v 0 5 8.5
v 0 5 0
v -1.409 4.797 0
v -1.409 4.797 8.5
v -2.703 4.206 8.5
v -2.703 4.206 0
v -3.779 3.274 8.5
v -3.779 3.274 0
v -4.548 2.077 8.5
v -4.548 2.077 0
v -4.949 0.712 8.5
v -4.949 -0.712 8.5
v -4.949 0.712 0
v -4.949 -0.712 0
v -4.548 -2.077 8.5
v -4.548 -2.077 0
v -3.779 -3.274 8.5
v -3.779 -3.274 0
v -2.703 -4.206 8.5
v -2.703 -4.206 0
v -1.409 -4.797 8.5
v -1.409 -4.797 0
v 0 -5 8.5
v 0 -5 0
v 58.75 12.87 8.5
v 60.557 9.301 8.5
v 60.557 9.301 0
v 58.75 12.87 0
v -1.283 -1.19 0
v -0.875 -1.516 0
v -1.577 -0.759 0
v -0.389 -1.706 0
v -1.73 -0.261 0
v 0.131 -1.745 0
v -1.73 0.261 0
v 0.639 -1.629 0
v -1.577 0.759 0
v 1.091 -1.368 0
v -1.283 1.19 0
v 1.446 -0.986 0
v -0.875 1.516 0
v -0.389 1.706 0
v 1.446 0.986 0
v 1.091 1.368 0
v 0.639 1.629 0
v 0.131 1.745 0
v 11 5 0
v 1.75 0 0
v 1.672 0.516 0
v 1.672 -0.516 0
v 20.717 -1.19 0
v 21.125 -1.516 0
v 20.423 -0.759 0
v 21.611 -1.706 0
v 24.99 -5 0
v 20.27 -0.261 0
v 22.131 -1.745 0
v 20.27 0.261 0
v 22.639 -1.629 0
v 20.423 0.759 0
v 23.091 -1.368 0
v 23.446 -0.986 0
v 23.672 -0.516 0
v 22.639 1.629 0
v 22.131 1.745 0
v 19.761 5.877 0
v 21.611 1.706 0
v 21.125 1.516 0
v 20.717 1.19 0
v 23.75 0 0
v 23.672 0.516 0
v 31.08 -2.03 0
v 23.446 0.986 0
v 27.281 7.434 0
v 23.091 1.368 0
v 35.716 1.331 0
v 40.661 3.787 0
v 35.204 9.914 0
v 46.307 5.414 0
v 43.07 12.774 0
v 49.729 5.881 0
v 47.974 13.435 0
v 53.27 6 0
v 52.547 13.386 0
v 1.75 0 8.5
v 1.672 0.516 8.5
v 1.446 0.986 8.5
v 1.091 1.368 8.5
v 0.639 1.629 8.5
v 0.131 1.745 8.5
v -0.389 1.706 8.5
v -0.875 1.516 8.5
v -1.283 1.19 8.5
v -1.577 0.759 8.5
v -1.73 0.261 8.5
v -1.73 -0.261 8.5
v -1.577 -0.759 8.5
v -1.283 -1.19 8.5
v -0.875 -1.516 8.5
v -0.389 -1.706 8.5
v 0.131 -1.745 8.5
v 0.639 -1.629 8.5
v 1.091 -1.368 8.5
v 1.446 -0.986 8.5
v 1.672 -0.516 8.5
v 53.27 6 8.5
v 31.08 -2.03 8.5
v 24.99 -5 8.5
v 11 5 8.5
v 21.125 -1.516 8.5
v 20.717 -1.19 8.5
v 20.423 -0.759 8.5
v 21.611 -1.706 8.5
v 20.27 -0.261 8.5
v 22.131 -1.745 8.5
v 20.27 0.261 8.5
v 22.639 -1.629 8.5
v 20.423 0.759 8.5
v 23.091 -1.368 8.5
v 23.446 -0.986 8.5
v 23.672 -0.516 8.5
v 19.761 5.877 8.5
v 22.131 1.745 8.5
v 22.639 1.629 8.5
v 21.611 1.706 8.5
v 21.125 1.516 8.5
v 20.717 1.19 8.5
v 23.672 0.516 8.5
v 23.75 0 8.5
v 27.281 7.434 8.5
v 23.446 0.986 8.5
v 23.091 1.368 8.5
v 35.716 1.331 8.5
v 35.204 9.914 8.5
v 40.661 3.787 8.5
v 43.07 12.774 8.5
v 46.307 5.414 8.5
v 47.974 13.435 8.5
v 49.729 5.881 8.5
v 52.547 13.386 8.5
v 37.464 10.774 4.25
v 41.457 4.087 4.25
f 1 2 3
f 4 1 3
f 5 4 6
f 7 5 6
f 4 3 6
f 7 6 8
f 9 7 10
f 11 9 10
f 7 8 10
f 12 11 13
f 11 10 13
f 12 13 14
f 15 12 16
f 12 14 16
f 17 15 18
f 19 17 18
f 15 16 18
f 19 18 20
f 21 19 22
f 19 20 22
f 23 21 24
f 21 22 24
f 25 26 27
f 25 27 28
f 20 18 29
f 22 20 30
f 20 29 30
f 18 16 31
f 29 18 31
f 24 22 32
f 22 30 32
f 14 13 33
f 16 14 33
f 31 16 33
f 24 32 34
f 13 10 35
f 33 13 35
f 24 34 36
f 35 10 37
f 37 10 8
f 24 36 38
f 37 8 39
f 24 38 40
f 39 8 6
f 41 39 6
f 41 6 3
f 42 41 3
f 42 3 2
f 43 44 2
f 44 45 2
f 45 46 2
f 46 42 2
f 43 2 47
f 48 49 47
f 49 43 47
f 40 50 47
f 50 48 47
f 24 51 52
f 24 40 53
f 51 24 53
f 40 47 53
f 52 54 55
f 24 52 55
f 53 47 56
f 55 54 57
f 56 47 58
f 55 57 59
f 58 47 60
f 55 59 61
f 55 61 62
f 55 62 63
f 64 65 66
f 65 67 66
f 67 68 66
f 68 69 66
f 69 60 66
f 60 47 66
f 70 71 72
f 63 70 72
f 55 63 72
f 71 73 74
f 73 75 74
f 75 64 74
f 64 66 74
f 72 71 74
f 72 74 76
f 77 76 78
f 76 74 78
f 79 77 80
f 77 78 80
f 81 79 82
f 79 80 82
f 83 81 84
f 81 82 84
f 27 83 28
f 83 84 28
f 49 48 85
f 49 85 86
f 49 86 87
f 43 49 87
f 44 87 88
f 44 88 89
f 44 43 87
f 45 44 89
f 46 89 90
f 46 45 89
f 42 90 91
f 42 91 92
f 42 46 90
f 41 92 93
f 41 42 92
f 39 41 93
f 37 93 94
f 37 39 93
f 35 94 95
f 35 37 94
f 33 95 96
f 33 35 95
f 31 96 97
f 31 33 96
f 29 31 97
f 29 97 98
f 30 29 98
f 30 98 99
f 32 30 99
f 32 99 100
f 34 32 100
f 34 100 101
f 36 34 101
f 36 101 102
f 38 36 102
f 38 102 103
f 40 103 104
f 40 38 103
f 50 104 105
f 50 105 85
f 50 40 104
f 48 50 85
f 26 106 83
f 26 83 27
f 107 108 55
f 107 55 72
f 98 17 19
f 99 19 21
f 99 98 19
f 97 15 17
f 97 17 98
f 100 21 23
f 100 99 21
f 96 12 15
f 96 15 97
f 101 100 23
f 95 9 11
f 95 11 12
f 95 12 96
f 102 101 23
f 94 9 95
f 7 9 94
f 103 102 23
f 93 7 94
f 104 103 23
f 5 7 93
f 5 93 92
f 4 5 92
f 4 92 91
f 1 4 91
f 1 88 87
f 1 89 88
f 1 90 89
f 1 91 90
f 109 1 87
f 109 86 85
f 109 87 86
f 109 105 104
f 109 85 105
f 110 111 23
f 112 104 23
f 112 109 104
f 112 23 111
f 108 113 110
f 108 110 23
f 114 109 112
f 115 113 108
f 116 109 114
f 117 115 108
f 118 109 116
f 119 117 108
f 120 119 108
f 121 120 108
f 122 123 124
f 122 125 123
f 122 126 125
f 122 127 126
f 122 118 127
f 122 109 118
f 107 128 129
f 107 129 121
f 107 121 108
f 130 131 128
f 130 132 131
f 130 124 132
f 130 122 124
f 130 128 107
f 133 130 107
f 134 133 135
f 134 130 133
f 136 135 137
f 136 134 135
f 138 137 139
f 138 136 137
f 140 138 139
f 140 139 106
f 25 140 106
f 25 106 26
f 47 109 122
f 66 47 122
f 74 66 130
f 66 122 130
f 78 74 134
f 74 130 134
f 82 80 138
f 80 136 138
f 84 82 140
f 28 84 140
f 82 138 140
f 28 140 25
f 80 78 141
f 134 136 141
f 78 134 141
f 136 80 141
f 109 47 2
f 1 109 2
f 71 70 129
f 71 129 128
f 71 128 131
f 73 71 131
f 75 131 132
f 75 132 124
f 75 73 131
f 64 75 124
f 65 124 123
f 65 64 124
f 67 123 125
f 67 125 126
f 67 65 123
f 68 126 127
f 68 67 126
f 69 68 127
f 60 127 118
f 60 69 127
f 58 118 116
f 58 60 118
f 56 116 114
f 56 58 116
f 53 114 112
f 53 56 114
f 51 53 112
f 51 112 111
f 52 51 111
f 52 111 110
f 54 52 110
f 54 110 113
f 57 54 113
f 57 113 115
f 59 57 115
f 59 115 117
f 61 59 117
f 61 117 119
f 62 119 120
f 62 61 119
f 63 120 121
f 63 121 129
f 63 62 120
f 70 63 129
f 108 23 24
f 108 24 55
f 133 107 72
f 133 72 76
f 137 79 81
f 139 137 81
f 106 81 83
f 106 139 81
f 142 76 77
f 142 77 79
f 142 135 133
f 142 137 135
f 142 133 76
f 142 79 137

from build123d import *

# Parameters (mm, degrees)
SKETCH1_R           = 1.75
BOSS_EXTRUDE1_DEPTH = 8.5
BOSS_EXTRUDE2_DEPTH = 8.5


with BuildPart() as part:
    # Sketch1 → Boss-Extrude1 (new body)
    with BuildSketch(Plane.XY):
        with BuildLine():
            Line((22, 5), (0, 5))
            ThreePointArc((0, 5), (-5, 0), (0, -5))
            Line((0, -5), (22, -5))
            ThreePointArc((22, -5), (27, 0), (22, 5))
        make_face()
        Circle(SKETCH1_R, mode=Mode.SUBTRACT)
        with Locations((22, 0)):
            Circle(SKETCH1_R, mode=Mode.SUBTRACT)
    extrude(amount=BOSS_EXTRUDE1_DEPTH)

    # Sketch2 → Boss-Extrude2 (add)
    with BuildSketch(Plane.XY.offset(8.5)):
        with BuildLine():
            Line((22, -5), (24.99, -5))
            Line((24.99, -5), (31.08, -2.029708536))
            add(Edge.make_bspline(
                [(31.08, -2.029708536), (40.738723452, 6.188270814), (53.27, 6)],
                knots=[0, 0, 0, 1, 1, 1], degree=2))
            Line((53.27, 6), (60.557013712, 9.301428655))
            Line((60.557013712, 9.301428655), (58.75, 12.87))
            add(Edge.make_bspline(
                [(11, 5), (22.833653526, 5.523226448), (40.580841183, 11.503835096), (45.245480449, 14.322205425), (58.75, 12.87)],
                knots=[0, 0, 0, 0, 0.506898999, 1, 1, 1, 1], degree=3))
            Line((11, 5), (22, 5))
            ThreePointArc((22, 5), (27, 0), (22, -5))
        make_face()
    extrude(amount=-BOSS_EXTRUDE2_DEPTH)


solid = part.part
